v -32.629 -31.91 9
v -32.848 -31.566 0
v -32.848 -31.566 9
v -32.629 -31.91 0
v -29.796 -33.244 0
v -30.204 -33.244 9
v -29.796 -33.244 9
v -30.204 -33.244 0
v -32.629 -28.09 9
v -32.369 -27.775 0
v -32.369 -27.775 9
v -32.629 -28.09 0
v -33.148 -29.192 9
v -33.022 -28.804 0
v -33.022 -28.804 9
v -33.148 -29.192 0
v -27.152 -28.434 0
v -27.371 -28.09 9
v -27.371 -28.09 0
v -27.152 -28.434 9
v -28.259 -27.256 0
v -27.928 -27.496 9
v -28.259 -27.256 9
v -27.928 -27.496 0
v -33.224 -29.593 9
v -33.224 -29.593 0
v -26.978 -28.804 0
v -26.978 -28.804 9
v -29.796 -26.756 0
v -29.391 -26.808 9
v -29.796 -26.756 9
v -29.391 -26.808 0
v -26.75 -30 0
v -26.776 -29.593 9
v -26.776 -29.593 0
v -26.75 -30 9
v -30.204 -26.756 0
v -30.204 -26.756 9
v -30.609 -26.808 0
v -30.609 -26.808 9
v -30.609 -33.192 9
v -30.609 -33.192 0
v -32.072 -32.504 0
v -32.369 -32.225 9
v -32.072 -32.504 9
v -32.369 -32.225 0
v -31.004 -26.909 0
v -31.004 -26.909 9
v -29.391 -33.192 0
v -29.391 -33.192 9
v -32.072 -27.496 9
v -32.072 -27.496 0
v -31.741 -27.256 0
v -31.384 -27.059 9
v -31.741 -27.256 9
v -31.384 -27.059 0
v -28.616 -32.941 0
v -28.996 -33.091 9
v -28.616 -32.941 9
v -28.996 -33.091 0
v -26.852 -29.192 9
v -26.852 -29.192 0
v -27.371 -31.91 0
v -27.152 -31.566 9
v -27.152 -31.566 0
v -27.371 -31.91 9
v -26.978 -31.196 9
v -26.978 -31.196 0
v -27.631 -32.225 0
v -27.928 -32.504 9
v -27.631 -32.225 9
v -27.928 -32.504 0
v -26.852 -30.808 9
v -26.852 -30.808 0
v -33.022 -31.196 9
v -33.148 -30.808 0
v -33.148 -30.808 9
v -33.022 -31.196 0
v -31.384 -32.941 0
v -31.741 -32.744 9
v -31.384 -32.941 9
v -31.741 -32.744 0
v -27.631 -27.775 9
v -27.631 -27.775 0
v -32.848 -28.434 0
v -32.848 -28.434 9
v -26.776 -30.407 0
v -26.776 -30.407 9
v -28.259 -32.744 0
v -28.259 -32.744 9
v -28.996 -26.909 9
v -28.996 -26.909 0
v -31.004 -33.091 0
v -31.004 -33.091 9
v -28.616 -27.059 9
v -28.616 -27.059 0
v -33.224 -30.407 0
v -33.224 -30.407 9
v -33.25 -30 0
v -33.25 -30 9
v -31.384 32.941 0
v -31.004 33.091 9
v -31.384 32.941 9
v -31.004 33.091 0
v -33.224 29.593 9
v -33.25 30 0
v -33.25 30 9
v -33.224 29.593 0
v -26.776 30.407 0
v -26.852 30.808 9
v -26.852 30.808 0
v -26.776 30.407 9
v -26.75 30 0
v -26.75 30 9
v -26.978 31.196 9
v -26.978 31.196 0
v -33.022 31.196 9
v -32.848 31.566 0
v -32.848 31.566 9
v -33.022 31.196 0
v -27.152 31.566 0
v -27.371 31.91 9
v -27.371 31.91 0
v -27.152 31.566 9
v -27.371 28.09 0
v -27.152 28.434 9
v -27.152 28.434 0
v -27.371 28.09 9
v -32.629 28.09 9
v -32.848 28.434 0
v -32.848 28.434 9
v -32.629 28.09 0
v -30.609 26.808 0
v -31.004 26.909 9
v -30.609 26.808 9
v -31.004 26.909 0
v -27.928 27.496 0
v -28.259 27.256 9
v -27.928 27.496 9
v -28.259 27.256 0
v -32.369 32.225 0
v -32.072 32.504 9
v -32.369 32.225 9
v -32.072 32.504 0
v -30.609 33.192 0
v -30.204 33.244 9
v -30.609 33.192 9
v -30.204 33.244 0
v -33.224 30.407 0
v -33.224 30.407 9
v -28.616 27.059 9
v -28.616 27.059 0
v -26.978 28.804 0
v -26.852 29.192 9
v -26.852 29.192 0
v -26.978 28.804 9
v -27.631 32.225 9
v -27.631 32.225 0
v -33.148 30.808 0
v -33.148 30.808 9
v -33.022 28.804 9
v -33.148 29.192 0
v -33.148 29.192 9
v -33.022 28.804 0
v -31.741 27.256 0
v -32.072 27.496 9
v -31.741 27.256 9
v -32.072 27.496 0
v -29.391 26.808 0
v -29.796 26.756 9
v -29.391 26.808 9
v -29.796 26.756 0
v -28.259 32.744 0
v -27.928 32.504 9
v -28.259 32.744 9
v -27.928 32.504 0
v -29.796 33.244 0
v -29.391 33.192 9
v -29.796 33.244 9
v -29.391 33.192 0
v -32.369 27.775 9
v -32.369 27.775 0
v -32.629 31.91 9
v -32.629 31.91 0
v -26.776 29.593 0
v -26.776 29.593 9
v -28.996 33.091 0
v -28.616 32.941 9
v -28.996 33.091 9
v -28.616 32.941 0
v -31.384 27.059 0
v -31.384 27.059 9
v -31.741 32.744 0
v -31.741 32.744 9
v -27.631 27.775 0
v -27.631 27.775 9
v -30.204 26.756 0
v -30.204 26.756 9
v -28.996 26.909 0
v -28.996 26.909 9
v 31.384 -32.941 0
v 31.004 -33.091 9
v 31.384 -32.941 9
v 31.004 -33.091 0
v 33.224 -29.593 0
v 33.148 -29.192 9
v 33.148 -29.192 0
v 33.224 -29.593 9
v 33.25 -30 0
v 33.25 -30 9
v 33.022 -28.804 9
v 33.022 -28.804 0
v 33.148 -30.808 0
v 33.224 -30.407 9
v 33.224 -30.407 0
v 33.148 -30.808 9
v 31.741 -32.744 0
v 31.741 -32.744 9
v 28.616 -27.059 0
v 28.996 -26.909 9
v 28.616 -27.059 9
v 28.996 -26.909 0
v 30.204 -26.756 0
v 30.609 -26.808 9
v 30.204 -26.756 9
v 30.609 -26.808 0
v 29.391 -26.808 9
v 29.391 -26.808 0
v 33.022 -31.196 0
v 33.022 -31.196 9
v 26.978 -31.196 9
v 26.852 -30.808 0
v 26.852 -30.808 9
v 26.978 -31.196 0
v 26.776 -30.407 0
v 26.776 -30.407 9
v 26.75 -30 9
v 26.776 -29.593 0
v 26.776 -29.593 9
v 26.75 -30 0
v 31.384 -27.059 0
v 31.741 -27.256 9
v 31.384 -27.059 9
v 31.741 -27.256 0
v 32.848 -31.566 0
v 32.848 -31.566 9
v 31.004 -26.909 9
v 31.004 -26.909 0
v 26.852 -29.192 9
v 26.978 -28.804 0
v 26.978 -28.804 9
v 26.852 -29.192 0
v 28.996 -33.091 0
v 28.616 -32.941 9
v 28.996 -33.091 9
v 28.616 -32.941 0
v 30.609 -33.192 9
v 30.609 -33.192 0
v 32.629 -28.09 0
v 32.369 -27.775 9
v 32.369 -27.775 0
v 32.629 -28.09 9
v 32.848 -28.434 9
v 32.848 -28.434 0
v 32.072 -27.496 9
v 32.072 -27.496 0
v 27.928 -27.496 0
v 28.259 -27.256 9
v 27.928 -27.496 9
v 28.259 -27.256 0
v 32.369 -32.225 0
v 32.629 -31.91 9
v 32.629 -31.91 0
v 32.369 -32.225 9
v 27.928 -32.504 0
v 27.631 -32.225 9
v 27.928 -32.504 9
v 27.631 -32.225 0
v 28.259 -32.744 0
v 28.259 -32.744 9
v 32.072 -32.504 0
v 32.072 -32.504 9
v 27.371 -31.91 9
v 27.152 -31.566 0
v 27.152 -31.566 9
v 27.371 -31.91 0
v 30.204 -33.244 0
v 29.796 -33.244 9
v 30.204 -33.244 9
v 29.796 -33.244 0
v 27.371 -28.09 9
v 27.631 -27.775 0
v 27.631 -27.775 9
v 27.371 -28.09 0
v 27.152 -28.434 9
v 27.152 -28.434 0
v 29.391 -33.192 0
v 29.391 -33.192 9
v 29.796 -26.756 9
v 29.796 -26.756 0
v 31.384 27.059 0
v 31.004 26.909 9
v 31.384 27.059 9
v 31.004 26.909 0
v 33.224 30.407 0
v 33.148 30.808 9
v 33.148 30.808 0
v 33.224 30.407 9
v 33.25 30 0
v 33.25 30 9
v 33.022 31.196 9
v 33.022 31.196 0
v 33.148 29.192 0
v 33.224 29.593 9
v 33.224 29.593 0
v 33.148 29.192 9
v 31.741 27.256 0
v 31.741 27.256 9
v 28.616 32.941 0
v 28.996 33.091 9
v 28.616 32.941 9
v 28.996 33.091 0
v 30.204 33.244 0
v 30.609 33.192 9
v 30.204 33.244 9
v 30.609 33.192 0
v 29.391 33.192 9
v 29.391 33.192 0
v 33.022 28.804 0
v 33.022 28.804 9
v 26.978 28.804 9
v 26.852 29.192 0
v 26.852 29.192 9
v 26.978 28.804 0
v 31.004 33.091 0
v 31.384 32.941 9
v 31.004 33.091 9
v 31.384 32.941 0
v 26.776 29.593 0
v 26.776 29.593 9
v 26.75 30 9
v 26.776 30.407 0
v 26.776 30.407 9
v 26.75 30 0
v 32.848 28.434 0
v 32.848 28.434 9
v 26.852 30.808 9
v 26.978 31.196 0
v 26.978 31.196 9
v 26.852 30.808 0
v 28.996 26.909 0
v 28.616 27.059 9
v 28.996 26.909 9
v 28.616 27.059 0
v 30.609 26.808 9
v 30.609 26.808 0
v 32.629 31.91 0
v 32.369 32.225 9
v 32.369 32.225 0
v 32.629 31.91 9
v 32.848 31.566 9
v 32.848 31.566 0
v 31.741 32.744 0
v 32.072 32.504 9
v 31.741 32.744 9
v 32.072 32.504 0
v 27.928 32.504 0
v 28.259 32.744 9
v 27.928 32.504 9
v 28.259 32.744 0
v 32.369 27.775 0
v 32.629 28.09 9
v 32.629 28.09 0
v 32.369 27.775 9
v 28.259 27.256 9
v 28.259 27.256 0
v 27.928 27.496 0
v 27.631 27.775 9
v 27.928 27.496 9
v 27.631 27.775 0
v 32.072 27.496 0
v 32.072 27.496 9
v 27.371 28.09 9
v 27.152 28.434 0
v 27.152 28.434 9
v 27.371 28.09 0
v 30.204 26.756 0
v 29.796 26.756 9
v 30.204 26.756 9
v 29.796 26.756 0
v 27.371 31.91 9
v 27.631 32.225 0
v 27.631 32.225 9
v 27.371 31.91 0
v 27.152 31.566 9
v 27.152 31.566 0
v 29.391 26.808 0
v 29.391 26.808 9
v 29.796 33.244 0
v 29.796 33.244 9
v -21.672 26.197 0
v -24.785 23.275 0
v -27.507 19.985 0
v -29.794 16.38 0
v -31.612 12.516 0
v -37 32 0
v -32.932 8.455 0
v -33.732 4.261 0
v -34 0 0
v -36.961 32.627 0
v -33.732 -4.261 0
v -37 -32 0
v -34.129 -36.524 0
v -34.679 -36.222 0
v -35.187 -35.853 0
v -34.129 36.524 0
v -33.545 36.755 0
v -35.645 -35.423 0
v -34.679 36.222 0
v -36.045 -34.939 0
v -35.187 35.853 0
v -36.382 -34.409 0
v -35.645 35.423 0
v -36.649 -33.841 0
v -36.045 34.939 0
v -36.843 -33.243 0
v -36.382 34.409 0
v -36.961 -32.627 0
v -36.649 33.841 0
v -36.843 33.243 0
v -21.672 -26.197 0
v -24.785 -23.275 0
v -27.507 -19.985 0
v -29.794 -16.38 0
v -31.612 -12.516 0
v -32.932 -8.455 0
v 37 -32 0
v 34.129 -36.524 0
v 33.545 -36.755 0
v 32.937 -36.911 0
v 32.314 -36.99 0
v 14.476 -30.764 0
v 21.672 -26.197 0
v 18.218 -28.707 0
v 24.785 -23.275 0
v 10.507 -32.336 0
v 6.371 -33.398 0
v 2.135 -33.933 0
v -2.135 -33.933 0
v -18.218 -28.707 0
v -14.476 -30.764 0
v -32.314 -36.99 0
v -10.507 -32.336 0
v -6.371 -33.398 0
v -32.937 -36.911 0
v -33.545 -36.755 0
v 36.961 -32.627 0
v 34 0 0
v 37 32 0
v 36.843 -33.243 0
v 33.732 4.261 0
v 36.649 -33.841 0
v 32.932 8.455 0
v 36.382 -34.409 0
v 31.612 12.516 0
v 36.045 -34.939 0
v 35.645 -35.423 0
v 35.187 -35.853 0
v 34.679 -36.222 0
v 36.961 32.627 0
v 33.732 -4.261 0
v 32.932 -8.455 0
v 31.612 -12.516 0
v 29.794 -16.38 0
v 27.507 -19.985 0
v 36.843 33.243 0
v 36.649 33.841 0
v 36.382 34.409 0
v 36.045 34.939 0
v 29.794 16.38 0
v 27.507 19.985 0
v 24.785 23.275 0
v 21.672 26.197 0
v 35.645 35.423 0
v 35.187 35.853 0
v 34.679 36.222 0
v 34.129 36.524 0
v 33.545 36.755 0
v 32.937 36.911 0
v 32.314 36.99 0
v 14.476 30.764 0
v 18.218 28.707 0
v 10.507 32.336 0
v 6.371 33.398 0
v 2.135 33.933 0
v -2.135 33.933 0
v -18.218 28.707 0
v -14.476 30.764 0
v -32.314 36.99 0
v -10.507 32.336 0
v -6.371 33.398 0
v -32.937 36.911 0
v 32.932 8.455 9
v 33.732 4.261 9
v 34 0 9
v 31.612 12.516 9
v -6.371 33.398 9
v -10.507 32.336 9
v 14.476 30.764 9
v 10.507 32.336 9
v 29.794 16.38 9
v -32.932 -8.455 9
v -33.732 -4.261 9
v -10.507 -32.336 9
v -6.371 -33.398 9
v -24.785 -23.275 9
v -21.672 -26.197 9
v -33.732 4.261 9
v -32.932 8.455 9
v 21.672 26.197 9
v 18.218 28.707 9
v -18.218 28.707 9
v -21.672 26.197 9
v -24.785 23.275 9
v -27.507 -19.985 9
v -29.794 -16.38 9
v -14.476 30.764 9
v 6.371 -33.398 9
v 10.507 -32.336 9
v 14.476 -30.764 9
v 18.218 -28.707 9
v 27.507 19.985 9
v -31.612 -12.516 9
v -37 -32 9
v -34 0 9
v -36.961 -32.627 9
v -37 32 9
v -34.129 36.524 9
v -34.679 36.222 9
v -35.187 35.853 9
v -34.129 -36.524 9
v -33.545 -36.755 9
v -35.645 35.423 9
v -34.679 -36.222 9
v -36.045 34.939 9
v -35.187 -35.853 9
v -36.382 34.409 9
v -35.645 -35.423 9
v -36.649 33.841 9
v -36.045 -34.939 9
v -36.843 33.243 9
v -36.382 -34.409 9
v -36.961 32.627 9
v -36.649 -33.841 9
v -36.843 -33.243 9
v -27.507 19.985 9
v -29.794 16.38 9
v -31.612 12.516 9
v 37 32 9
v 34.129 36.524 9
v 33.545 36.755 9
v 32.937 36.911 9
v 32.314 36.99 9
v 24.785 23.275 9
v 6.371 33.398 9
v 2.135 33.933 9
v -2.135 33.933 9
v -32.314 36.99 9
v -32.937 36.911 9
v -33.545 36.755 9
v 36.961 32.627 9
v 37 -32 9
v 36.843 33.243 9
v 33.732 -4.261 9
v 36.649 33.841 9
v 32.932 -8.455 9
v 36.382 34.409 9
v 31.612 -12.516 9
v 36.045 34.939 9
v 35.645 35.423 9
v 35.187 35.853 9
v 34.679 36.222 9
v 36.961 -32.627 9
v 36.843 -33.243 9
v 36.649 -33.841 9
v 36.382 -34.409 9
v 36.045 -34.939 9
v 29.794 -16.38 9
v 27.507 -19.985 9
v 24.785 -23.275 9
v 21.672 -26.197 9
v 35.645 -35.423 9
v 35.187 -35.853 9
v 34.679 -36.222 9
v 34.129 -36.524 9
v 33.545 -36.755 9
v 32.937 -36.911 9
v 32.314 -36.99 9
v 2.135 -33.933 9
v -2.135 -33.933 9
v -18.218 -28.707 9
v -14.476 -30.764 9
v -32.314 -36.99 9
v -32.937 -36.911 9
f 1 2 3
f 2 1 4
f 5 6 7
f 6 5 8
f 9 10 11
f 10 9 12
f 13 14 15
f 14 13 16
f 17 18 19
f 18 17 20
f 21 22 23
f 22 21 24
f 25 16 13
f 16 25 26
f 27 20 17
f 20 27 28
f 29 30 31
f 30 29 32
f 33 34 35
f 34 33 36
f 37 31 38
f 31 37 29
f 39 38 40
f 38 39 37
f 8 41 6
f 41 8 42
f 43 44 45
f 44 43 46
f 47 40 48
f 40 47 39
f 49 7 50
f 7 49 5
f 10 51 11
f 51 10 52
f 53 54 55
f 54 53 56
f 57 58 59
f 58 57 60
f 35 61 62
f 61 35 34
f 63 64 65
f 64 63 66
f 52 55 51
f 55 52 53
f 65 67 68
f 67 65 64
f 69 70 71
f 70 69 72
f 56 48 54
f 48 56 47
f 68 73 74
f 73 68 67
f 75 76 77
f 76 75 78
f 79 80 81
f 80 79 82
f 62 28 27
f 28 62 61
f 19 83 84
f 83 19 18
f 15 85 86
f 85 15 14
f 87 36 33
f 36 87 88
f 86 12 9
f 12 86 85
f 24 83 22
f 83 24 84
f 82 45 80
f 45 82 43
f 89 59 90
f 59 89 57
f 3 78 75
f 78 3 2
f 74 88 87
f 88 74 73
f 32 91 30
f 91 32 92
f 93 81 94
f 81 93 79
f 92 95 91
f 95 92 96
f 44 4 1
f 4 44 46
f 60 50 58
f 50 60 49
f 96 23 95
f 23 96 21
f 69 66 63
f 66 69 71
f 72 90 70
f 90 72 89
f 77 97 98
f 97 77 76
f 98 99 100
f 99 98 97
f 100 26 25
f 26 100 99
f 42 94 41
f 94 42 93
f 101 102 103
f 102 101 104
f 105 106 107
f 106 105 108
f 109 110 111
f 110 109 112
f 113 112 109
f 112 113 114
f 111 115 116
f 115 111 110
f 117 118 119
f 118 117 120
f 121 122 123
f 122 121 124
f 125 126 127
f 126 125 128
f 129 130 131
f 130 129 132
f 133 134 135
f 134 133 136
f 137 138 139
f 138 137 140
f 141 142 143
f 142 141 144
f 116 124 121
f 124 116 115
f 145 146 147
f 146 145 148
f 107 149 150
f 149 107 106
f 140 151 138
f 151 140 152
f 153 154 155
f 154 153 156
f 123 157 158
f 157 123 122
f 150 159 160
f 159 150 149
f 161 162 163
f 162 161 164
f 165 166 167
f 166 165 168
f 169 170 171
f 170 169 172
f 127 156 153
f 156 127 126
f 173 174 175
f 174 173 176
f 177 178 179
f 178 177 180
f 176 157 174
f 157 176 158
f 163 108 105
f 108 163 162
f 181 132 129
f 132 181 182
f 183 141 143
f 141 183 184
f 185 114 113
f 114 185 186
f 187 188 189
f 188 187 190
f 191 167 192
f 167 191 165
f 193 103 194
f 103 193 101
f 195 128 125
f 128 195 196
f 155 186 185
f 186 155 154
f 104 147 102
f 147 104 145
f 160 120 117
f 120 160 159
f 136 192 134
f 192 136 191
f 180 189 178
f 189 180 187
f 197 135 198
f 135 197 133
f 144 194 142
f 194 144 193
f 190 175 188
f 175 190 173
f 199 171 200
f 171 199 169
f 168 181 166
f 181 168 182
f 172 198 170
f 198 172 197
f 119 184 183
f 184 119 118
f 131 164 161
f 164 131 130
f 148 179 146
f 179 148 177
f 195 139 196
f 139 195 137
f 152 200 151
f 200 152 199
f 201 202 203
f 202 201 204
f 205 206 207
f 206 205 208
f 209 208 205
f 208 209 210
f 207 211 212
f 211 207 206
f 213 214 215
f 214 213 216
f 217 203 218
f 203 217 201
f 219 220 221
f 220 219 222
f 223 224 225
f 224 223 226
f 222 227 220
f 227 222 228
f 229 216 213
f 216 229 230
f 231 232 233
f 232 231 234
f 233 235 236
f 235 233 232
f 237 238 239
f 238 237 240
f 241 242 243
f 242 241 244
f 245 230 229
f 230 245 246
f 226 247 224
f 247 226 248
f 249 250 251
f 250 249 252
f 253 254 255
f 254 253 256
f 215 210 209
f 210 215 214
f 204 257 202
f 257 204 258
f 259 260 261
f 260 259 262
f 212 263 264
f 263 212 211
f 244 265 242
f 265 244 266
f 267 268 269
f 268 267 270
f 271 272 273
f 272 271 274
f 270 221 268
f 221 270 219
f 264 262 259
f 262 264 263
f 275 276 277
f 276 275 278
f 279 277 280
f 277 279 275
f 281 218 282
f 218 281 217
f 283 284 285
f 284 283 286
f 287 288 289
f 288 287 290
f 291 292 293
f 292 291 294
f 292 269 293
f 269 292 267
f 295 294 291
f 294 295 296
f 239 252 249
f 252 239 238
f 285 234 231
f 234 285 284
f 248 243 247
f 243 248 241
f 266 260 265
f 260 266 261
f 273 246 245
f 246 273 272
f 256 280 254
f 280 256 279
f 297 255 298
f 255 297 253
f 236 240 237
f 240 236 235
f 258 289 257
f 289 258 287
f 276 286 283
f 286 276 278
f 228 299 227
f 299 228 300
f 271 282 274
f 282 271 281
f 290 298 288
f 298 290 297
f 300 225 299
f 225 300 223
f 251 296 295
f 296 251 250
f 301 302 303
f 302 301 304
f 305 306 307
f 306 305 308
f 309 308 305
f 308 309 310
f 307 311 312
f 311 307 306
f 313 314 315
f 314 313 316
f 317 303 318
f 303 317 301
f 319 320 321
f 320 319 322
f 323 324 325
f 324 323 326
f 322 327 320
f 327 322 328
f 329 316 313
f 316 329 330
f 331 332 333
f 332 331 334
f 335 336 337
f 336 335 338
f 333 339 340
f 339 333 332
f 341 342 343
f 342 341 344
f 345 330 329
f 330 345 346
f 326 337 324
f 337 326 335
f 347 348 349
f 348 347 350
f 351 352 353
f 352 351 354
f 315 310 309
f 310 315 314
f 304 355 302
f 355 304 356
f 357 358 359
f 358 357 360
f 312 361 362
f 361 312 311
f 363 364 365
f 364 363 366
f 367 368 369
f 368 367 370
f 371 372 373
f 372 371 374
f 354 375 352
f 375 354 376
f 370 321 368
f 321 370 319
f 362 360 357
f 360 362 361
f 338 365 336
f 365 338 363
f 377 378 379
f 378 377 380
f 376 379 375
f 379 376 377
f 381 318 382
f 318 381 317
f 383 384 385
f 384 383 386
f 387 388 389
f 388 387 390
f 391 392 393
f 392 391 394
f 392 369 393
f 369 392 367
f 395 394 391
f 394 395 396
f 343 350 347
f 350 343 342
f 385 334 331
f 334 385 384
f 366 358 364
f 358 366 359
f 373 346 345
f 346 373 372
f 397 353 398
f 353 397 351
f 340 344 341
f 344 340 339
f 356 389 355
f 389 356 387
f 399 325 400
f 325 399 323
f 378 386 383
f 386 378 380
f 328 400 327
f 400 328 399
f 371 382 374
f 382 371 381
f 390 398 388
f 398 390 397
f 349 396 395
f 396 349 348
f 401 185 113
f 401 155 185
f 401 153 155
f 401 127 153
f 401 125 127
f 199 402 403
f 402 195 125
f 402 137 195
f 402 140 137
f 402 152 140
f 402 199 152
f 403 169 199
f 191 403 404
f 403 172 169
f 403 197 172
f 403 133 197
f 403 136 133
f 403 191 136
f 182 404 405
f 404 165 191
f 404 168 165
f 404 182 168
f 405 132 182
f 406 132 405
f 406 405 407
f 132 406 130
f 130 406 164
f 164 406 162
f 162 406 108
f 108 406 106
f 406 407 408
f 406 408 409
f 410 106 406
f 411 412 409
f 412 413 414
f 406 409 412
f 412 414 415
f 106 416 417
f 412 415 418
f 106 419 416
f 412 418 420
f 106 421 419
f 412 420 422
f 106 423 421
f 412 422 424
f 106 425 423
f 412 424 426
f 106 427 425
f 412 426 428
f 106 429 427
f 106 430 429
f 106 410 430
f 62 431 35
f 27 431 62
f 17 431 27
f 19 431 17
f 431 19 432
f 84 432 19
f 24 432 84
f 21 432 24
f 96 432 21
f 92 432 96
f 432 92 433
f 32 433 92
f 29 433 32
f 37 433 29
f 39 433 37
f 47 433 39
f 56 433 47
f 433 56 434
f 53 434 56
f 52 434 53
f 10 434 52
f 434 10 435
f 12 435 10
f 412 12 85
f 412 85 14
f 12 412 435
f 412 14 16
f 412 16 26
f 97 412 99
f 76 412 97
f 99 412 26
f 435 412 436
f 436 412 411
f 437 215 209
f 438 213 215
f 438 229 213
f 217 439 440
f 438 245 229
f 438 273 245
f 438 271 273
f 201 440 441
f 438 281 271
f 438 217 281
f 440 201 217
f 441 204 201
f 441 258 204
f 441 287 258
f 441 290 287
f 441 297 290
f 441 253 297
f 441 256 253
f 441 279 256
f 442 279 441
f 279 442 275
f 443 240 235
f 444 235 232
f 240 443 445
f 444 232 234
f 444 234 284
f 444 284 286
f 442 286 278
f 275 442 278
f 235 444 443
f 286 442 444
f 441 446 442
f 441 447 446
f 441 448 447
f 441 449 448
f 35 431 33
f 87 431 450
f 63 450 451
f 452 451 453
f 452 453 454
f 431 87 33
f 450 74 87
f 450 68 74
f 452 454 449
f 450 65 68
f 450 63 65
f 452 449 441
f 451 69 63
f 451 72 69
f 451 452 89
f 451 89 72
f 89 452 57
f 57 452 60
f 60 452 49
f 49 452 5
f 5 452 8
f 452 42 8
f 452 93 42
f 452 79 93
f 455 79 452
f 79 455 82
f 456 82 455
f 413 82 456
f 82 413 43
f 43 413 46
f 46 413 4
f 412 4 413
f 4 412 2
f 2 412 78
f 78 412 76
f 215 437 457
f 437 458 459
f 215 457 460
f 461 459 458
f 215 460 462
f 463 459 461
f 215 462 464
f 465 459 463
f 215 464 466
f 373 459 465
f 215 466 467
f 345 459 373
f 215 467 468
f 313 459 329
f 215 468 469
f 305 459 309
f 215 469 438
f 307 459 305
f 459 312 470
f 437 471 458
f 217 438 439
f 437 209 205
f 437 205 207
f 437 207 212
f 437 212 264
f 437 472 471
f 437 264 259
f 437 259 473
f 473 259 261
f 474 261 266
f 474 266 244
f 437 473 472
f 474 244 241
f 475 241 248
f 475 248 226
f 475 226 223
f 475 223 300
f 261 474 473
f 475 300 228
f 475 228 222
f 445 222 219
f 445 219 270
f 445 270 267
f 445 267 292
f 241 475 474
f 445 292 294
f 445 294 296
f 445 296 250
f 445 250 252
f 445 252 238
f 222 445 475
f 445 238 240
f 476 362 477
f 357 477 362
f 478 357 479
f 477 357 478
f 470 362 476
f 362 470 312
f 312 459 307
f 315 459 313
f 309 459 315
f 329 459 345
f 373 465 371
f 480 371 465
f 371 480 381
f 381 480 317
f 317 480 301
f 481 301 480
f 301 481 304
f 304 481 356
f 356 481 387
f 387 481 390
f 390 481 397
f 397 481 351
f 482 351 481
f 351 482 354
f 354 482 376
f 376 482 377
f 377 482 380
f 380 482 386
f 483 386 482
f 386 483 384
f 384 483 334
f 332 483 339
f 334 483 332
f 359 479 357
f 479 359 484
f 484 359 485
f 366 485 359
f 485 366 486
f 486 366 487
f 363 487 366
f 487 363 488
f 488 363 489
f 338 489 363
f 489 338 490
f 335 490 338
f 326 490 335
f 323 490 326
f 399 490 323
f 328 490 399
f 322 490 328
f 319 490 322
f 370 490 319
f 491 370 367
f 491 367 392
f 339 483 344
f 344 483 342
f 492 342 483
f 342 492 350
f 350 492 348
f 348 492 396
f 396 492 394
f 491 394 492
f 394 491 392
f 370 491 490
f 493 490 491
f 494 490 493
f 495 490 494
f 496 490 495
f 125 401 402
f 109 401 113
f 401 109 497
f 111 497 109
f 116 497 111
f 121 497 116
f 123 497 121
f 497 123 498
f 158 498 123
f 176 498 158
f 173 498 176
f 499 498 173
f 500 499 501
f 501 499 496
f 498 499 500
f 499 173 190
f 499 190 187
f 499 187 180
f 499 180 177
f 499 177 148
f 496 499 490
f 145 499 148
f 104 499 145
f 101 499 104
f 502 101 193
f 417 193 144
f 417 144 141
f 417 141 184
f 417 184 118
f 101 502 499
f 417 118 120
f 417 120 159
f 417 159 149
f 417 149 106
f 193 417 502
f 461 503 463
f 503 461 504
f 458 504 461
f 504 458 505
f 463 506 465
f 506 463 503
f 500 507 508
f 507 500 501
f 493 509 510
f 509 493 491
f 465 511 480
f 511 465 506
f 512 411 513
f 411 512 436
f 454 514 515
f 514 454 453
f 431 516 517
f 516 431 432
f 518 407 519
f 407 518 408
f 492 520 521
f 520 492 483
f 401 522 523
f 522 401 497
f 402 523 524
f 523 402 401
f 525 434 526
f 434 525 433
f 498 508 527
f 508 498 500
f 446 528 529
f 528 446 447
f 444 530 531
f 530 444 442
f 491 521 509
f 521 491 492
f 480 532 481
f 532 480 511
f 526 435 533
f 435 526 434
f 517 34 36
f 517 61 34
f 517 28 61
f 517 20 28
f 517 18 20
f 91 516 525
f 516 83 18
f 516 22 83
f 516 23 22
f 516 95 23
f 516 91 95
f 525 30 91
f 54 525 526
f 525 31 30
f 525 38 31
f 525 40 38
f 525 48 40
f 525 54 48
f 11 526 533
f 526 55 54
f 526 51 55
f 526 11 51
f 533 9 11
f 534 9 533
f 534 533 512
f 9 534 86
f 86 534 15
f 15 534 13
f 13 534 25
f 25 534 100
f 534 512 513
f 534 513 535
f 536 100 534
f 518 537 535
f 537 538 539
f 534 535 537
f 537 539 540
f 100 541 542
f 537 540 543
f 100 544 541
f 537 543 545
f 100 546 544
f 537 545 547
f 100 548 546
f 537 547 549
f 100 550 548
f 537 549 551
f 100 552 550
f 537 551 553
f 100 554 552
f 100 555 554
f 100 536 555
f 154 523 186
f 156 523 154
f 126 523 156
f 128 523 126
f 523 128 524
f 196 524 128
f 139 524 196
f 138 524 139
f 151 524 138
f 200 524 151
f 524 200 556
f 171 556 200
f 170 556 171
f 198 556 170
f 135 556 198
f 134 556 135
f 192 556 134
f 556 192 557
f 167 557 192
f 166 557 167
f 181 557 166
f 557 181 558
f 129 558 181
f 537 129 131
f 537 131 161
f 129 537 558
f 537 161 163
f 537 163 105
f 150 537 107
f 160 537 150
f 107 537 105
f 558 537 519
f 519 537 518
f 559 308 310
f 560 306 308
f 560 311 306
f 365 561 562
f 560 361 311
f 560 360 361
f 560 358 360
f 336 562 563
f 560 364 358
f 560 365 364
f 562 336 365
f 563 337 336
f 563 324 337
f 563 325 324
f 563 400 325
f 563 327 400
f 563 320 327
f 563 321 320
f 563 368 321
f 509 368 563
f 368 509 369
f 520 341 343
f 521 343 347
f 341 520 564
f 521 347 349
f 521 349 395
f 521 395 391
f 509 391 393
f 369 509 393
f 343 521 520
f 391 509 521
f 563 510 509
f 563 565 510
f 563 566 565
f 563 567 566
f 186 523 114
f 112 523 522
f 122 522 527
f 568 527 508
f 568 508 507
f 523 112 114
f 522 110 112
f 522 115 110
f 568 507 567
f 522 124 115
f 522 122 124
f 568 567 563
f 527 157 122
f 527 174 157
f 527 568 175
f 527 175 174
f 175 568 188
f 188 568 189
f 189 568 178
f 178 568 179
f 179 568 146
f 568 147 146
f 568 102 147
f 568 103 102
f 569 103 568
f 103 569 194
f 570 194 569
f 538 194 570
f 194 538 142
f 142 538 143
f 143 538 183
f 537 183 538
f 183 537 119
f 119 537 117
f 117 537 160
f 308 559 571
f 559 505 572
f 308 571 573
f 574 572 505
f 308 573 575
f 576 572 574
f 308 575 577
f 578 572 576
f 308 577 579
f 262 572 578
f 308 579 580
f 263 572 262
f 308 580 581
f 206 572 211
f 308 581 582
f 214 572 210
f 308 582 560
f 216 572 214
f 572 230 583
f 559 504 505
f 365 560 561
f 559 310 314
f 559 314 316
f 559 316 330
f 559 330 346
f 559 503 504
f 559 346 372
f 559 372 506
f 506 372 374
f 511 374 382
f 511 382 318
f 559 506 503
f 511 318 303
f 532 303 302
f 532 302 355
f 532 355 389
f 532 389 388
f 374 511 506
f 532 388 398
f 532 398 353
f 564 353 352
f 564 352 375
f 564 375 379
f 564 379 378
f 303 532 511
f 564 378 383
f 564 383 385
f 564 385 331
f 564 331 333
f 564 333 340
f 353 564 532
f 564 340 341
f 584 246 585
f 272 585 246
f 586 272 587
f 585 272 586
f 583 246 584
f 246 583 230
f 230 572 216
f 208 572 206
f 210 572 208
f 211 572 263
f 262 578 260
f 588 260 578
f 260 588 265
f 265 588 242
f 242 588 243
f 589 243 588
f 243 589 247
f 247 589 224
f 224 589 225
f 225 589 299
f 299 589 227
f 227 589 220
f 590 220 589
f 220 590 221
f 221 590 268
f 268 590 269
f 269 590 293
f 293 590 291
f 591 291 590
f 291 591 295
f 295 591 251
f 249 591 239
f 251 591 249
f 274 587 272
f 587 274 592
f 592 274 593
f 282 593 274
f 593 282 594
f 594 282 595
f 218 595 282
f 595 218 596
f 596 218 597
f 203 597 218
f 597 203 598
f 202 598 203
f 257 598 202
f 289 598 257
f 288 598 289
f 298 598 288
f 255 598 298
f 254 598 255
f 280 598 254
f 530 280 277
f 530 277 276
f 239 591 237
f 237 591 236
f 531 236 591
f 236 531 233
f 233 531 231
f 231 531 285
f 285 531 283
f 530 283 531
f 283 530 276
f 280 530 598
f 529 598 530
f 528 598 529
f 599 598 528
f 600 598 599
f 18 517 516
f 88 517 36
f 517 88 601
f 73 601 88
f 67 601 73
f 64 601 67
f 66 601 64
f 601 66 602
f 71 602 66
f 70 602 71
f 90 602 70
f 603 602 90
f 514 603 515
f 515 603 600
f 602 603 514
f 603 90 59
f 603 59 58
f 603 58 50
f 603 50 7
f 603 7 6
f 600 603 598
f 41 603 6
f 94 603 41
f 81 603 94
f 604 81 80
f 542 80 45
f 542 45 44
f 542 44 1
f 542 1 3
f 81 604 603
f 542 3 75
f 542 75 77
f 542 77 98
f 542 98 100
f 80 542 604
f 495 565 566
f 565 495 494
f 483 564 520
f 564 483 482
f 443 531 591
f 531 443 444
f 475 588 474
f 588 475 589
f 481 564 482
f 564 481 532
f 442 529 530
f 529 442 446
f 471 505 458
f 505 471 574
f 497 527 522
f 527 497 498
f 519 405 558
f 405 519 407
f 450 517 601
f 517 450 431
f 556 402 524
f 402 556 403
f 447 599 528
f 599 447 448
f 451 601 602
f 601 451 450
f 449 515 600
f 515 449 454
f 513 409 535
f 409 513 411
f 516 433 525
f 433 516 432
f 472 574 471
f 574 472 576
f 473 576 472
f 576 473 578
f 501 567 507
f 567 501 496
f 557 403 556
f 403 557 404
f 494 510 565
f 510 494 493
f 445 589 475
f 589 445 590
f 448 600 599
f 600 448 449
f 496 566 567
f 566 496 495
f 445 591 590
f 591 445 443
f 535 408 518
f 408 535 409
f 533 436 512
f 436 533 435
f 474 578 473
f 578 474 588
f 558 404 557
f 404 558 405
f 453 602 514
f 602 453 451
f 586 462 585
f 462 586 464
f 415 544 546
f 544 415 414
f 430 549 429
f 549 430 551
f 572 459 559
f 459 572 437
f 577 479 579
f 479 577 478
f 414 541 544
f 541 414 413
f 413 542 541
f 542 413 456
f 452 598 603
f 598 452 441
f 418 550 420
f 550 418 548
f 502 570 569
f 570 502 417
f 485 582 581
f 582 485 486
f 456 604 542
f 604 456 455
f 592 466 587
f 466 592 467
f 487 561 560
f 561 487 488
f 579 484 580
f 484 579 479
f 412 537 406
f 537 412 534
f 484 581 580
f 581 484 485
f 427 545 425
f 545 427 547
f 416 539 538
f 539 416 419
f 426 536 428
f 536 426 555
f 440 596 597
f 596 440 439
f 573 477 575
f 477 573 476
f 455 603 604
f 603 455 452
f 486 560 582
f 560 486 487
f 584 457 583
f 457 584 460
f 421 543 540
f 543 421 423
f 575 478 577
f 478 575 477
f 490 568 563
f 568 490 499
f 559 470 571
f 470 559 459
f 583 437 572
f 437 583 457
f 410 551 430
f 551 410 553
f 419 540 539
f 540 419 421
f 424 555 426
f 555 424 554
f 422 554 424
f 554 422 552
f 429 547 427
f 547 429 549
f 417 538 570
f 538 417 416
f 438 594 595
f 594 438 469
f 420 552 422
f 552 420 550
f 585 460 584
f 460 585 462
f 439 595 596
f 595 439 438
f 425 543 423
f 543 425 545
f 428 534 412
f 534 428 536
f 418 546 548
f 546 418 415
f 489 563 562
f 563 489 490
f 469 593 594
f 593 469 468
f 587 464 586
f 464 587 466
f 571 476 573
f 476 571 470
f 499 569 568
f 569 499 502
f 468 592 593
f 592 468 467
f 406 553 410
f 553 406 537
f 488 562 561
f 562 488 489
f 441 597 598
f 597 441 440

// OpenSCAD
$fn = 50;


difference() {
	union() {
		hull() {
			translate(v = [-32.0000000000, 32.0000000000, 0]) {
				cylinder(h = 9, r = 5);
			}
			translate(v = [32.0000000000, 32.0000000000, 0]) {
				cylinder(h = 9, r = 5);
			}
			translate(v = [-32.0000000000, -32.0000000000, 0]) {
				cylinder(h = 9, r = 5);
			}
			translate(v = [32.0000000000, -32.0000000000, 0]) {
				cylinder(h = 9, r = 5);
			}
		}
	}
	union() {
		#translate(v = [-30.0000000000, -30.0000000000, -100.0000000000]) {
			cylinder(h = 200, r = 3.2500000000);
		}
		#translate(v = [-30.0000000000, 30.0000000000, -100.0000000000]) {
			cylinder(h = 200, r = 3.2500000000);
		}
		#translate(v = [30.0000000000, -30.0000000000, -100.0000000000]) {
			cylinder(h = 200, r = 3.2500000000);
		}
		#translate(v = [30.0000000000, 30.0000000000, -100.0000000000]) {
			cylinder(h = 200, r = 3.2500000000);
		}
		#cylinder(h = 9, r = 34.0000000000);
	}
}
